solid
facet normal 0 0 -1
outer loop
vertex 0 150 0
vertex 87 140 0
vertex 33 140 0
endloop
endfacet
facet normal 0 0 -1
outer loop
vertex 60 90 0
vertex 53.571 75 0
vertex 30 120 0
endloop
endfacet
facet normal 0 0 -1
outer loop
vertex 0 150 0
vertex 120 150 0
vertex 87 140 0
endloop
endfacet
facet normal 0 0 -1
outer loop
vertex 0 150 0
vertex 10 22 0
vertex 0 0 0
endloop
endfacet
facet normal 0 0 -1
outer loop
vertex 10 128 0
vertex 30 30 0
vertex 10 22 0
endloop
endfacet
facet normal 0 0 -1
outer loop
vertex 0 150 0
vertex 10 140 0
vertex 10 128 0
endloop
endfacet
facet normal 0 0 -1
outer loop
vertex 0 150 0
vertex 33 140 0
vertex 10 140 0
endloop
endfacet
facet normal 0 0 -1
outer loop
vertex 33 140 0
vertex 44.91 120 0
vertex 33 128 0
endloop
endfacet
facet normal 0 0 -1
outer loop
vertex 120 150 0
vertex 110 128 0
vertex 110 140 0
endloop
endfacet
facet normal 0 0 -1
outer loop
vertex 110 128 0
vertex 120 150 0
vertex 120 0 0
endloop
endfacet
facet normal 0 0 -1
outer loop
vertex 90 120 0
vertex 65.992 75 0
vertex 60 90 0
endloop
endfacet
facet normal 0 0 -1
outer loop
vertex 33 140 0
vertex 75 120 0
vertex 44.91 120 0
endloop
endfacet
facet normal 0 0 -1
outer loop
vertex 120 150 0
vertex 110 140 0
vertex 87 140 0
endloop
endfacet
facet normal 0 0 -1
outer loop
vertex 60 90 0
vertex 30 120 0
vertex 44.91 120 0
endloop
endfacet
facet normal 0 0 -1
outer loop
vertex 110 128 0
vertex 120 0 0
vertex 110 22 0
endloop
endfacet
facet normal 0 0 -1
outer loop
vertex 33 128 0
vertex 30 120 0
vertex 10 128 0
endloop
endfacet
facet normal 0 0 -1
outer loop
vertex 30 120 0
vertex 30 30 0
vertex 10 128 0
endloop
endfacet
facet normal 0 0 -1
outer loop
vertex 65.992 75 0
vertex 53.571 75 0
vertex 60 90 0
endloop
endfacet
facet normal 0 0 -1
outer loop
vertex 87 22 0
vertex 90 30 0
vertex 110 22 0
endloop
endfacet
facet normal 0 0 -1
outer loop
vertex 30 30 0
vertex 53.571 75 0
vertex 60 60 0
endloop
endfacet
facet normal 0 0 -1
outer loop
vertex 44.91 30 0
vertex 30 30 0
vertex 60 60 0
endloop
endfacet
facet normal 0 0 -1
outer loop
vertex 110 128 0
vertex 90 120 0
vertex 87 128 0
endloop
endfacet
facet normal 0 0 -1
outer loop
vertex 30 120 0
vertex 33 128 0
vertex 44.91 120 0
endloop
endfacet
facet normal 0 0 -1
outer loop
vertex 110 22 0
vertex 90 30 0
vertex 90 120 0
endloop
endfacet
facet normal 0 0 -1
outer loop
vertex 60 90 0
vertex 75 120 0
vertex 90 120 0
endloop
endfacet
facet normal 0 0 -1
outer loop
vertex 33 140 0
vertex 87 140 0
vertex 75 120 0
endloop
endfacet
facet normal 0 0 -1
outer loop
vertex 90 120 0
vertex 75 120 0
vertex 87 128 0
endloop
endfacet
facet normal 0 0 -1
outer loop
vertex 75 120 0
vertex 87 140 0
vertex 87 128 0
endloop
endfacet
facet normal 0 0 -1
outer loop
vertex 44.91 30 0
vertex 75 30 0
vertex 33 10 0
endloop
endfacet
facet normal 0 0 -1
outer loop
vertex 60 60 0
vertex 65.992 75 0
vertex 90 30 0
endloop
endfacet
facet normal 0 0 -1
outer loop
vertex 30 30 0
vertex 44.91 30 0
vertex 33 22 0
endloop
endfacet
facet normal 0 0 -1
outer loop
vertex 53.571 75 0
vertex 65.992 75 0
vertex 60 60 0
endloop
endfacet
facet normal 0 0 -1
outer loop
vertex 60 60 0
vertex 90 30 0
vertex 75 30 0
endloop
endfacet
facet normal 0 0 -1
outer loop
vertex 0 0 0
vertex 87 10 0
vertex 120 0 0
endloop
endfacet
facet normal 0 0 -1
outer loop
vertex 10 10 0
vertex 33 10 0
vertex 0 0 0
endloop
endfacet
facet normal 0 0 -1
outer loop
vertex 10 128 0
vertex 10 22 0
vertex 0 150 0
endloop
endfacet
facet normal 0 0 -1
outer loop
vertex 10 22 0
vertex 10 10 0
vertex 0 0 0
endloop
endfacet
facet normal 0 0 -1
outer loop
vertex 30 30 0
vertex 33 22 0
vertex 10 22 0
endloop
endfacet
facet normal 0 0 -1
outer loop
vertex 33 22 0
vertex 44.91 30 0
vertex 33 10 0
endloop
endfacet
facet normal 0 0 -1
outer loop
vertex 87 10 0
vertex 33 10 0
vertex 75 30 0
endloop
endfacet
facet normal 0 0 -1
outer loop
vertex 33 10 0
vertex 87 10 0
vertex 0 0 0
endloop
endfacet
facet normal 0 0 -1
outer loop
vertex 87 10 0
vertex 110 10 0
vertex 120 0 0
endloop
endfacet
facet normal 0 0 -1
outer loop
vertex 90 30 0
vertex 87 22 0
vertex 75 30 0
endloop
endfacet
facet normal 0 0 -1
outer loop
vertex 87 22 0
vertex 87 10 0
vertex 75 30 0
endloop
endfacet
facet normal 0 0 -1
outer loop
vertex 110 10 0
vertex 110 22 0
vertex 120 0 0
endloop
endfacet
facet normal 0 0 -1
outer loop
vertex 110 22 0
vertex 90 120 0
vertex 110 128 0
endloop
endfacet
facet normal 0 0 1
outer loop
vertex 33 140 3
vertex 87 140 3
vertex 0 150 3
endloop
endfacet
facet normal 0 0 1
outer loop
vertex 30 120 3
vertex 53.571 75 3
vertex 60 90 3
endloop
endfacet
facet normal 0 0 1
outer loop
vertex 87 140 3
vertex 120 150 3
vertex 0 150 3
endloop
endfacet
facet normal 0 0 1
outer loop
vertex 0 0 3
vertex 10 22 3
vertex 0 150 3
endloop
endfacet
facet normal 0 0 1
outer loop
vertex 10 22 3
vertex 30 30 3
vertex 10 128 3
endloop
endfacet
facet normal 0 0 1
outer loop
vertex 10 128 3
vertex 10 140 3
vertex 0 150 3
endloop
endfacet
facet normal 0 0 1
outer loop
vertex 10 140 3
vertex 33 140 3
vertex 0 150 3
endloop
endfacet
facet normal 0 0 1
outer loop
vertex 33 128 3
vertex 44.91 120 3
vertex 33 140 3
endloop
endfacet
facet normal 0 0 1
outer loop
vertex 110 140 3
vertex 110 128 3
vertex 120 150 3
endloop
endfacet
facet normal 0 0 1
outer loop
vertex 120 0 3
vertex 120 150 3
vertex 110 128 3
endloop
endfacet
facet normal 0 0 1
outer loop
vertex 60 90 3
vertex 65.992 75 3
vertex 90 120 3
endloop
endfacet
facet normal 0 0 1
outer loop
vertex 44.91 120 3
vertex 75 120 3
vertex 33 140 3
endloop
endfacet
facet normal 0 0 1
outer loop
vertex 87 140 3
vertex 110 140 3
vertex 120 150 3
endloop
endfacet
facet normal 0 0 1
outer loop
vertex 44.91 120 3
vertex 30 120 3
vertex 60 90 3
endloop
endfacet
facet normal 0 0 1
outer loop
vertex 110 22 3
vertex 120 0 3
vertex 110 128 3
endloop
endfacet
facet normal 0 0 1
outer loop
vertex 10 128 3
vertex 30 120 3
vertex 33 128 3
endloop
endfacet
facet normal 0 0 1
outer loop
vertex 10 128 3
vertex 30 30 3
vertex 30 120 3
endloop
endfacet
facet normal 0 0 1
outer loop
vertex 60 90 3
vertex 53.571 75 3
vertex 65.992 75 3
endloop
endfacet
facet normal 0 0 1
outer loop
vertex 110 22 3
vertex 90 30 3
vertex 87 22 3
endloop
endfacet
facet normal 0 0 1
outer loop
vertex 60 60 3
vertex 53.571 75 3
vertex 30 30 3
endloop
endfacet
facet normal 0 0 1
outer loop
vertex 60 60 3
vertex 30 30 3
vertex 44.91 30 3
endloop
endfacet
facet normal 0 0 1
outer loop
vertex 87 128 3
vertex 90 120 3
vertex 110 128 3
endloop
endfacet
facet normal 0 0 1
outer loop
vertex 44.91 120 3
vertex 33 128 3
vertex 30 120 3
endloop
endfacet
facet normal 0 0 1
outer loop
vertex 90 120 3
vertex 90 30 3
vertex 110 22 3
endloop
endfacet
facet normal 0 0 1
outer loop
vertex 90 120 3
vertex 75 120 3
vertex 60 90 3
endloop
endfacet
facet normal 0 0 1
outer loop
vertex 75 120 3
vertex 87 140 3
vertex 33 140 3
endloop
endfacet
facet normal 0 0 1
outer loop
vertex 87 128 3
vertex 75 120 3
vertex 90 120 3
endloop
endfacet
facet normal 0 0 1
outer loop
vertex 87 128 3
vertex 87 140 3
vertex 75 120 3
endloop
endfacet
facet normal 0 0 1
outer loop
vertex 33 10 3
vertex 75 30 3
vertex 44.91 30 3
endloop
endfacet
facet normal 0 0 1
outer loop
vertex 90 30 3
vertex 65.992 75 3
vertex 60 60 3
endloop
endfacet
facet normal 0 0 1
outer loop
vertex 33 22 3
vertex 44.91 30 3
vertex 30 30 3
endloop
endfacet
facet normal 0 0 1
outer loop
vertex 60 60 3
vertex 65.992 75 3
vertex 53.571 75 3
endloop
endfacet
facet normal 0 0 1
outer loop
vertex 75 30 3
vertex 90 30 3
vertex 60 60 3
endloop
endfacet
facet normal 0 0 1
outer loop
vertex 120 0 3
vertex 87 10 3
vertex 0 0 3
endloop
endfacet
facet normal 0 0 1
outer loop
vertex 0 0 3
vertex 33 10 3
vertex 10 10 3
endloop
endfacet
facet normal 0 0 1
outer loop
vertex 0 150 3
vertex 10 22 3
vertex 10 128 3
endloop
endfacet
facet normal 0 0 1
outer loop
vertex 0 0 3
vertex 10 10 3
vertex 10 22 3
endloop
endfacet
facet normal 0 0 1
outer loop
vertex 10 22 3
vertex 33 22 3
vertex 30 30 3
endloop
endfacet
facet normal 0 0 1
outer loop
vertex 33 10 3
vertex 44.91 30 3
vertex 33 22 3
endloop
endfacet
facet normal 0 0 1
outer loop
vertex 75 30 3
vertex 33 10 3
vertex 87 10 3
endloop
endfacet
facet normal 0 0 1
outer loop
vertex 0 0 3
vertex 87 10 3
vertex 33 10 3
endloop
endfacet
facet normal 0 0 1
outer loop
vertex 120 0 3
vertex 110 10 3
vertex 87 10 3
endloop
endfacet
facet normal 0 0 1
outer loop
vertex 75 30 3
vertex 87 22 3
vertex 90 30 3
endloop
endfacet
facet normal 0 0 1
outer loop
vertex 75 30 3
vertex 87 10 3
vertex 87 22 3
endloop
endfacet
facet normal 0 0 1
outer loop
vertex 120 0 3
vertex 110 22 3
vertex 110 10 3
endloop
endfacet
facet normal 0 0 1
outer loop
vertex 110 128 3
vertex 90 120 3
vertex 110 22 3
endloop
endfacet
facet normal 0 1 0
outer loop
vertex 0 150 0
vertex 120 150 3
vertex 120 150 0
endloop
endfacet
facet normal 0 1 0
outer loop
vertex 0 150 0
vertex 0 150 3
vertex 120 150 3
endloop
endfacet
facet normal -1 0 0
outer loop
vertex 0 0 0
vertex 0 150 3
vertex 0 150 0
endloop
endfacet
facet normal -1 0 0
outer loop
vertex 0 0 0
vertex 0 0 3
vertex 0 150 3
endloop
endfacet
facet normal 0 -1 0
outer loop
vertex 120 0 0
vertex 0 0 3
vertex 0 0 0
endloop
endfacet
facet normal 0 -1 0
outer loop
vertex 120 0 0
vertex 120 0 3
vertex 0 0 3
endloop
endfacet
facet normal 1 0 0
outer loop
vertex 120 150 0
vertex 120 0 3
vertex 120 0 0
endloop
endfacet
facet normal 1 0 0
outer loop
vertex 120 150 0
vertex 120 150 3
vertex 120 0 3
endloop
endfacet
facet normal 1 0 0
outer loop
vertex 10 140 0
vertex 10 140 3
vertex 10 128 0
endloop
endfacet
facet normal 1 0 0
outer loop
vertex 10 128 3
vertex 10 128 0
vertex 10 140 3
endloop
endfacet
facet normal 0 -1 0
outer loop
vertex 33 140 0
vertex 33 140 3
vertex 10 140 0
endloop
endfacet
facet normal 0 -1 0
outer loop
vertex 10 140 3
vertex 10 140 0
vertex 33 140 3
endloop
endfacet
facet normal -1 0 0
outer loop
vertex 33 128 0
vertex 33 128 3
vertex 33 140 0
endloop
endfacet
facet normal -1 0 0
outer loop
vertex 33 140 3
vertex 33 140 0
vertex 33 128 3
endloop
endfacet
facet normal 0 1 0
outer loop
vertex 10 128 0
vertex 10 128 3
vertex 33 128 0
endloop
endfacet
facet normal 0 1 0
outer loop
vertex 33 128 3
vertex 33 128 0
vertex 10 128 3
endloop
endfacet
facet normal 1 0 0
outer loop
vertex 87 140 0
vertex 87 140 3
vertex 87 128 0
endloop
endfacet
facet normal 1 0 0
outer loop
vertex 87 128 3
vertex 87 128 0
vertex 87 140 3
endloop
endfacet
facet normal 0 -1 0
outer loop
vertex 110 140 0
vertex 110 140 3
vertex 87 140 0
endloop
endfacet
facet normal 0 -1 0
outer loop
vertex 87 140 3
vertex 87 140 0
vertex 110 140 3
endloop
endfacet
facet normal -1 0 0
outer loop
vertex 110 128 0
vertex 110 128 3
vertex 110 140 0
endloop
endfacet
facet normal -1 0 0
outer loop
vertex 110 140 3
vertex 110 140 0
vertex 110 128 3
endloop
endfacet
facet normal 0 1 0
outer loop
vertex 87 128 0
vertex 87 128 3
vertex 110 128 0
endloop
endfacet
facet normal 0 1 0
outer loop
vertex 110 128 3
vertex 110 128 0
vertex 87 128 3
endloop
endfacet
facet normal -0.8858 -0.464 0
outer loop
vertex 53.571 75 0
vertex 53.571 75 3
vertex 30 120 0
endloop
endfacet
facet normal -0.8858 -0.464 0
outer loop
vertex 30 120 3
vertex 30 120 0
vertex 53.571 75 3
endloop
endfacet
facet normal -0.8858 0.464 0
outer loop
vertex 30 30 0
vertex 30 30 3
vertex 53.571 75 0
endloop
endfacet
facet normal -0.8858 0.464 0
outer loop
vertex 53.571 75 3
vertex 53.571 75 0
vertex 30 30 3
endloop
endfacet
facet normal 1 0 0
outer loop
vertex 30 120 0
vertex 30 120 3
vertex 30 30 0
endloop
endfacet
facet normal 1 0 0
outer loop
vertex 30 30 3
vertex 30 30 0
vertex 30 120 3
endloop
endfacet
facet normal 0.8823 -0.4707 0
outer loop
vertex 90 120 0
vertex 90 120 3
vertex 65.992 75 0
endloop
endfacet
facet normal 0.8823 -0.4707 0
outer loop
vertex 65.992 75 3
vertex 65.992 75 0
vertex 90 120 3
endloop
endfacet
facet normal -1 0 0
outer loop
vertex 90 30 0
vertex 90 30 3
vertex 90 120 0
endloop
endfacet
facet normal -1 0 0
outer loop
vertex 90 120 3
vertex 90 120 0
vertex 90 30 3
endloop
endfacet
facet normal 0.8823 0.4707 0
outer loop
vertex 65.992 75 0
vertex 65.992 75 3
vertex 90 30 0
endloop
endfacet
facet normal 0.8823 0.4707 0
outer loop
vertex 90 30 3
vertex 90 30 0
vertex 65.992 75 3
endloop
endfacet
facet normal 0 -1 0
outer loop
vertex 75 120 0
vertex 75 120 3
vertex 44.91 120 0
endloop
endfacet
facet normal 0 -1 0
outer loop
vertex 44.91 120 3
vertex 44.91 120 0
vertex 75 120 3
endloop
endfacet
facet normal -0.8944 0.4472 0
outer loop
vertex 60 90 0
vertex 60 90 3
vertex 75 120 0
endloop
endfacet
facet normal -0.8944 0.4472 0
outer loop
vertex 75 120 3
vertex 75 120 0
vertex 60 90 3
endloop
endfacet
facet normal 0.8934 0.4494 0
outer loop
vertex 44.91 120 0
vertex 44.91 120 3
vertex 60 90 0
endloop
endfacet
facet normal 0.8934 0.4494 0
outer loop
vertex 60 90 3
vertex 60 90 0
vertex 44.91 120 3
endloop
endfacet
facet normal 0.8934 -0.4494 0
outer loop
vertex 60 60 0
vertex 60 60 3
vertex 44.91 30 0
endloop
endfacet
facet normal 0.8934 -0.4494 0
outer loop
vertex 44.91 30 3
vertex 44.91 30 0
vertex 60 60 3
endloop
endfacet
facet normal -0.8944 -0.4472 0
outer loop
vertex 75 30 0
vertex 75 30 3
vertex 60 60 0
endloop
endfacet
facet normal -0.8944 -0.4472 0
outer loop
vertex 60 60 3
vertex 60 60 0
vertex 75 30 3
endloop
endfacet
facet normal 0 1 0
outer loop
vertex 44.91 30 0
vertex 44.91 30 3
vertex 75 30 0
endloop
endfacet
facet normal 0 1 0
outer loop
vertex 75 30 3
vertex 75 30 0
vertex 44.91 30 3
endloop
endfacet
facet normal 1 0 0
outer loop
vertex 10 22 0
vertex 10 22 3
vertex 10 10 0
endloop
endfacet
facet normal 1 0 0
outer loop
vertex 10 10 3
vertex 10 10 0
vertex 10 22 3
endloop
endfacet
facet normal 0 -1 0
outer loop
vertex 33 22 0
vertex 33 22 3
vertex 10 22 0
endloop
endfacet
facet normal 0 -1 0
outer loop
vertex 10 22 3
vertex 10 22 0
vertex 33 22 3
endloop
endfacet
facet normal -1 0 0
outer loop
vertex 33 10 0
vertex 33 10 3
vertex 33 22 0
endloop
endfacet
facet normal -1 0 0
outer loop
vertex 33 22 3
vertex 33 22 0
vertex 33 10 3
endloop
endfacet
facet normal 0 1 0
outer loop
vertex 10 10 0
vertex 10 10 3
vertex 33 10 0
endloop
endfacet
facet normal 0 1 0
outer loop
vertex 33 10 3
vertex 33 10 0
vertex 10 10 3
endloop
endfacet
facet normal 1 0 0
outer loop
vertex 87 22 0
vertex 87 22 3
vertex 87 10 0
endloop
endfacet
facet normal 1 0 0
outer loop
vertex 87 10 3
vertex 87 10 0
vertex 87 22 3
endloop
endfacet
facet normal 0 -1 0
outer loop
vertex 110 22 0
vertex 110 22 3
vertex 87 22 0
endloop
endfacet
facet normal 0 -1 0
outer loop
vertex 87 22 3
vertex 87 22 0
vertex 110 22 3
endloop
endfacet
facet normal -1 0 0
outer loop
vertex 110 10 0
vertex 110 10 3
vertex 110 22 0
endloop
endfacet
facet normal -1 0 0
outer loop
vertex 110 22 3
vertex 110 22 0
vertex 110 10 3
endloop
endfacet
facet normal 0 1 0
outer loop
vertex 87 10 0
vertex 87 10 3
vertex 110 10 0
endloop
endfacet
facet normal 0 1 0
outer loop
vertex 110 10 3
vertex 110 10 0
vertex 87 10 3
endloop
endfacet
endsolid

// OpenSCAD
//Body plate for Quadroped robot 
// parameterized current set up for 9g servos 


//scale bottom plate with length 
length = 150;
//scale servo distance from edge 
servoOfset = 10;

// servo hole function calculates points for polygon 
//scale for servo size 
servoWidth = 12; 
servoLen = 23; 
//calculates corner points for servo of specified size
function stepprHole (x,y) = [[x+servoLen,y],[x+servoLen,y+servoWidth],[x,y+servoWidth],[x,y]];

// dont change (scales based on above parameters)
// |||||||||||
// VVVVVVVVVVV  
width=length/1.25;
linear_extrude(height=length/50){
    difference() {
        //body plate start to draw at origin 
        polygon(points=[[0,0],[0,length],[width,length],[width,0]]);
        //central triangles 
        polygon(points=[[length/5,width/4],[length/2.8,width/1.6],[length/5,width]]);
        polygon(points=[[length*(3/5),width/4],[length/2.273,width/1.6],[length*(3/5),width]]);
        polygon(points=[[length/3.34,width/4],[length/2,width/4],[length/2.5,width/2]]);
        polygon(points=[[length/3.34,width],[length/2,width],[length/2.5,width*(3/4)]]);
        //servo cut outs 
        //front
        polygon(points=stepprHole(servoOfset,servoOfset));
        polygon(points=stepprHole(width-(servoOfset+servoLen),servoOfset));
        //back
        polygon(points=stepprHole(servoOfset,length-(servoWidth+servoOfset)));
        polygon(points=stepprHole(width-(servoOfset+servoLen),length-(servoWidth+servoOfset)));    
    } 
}
